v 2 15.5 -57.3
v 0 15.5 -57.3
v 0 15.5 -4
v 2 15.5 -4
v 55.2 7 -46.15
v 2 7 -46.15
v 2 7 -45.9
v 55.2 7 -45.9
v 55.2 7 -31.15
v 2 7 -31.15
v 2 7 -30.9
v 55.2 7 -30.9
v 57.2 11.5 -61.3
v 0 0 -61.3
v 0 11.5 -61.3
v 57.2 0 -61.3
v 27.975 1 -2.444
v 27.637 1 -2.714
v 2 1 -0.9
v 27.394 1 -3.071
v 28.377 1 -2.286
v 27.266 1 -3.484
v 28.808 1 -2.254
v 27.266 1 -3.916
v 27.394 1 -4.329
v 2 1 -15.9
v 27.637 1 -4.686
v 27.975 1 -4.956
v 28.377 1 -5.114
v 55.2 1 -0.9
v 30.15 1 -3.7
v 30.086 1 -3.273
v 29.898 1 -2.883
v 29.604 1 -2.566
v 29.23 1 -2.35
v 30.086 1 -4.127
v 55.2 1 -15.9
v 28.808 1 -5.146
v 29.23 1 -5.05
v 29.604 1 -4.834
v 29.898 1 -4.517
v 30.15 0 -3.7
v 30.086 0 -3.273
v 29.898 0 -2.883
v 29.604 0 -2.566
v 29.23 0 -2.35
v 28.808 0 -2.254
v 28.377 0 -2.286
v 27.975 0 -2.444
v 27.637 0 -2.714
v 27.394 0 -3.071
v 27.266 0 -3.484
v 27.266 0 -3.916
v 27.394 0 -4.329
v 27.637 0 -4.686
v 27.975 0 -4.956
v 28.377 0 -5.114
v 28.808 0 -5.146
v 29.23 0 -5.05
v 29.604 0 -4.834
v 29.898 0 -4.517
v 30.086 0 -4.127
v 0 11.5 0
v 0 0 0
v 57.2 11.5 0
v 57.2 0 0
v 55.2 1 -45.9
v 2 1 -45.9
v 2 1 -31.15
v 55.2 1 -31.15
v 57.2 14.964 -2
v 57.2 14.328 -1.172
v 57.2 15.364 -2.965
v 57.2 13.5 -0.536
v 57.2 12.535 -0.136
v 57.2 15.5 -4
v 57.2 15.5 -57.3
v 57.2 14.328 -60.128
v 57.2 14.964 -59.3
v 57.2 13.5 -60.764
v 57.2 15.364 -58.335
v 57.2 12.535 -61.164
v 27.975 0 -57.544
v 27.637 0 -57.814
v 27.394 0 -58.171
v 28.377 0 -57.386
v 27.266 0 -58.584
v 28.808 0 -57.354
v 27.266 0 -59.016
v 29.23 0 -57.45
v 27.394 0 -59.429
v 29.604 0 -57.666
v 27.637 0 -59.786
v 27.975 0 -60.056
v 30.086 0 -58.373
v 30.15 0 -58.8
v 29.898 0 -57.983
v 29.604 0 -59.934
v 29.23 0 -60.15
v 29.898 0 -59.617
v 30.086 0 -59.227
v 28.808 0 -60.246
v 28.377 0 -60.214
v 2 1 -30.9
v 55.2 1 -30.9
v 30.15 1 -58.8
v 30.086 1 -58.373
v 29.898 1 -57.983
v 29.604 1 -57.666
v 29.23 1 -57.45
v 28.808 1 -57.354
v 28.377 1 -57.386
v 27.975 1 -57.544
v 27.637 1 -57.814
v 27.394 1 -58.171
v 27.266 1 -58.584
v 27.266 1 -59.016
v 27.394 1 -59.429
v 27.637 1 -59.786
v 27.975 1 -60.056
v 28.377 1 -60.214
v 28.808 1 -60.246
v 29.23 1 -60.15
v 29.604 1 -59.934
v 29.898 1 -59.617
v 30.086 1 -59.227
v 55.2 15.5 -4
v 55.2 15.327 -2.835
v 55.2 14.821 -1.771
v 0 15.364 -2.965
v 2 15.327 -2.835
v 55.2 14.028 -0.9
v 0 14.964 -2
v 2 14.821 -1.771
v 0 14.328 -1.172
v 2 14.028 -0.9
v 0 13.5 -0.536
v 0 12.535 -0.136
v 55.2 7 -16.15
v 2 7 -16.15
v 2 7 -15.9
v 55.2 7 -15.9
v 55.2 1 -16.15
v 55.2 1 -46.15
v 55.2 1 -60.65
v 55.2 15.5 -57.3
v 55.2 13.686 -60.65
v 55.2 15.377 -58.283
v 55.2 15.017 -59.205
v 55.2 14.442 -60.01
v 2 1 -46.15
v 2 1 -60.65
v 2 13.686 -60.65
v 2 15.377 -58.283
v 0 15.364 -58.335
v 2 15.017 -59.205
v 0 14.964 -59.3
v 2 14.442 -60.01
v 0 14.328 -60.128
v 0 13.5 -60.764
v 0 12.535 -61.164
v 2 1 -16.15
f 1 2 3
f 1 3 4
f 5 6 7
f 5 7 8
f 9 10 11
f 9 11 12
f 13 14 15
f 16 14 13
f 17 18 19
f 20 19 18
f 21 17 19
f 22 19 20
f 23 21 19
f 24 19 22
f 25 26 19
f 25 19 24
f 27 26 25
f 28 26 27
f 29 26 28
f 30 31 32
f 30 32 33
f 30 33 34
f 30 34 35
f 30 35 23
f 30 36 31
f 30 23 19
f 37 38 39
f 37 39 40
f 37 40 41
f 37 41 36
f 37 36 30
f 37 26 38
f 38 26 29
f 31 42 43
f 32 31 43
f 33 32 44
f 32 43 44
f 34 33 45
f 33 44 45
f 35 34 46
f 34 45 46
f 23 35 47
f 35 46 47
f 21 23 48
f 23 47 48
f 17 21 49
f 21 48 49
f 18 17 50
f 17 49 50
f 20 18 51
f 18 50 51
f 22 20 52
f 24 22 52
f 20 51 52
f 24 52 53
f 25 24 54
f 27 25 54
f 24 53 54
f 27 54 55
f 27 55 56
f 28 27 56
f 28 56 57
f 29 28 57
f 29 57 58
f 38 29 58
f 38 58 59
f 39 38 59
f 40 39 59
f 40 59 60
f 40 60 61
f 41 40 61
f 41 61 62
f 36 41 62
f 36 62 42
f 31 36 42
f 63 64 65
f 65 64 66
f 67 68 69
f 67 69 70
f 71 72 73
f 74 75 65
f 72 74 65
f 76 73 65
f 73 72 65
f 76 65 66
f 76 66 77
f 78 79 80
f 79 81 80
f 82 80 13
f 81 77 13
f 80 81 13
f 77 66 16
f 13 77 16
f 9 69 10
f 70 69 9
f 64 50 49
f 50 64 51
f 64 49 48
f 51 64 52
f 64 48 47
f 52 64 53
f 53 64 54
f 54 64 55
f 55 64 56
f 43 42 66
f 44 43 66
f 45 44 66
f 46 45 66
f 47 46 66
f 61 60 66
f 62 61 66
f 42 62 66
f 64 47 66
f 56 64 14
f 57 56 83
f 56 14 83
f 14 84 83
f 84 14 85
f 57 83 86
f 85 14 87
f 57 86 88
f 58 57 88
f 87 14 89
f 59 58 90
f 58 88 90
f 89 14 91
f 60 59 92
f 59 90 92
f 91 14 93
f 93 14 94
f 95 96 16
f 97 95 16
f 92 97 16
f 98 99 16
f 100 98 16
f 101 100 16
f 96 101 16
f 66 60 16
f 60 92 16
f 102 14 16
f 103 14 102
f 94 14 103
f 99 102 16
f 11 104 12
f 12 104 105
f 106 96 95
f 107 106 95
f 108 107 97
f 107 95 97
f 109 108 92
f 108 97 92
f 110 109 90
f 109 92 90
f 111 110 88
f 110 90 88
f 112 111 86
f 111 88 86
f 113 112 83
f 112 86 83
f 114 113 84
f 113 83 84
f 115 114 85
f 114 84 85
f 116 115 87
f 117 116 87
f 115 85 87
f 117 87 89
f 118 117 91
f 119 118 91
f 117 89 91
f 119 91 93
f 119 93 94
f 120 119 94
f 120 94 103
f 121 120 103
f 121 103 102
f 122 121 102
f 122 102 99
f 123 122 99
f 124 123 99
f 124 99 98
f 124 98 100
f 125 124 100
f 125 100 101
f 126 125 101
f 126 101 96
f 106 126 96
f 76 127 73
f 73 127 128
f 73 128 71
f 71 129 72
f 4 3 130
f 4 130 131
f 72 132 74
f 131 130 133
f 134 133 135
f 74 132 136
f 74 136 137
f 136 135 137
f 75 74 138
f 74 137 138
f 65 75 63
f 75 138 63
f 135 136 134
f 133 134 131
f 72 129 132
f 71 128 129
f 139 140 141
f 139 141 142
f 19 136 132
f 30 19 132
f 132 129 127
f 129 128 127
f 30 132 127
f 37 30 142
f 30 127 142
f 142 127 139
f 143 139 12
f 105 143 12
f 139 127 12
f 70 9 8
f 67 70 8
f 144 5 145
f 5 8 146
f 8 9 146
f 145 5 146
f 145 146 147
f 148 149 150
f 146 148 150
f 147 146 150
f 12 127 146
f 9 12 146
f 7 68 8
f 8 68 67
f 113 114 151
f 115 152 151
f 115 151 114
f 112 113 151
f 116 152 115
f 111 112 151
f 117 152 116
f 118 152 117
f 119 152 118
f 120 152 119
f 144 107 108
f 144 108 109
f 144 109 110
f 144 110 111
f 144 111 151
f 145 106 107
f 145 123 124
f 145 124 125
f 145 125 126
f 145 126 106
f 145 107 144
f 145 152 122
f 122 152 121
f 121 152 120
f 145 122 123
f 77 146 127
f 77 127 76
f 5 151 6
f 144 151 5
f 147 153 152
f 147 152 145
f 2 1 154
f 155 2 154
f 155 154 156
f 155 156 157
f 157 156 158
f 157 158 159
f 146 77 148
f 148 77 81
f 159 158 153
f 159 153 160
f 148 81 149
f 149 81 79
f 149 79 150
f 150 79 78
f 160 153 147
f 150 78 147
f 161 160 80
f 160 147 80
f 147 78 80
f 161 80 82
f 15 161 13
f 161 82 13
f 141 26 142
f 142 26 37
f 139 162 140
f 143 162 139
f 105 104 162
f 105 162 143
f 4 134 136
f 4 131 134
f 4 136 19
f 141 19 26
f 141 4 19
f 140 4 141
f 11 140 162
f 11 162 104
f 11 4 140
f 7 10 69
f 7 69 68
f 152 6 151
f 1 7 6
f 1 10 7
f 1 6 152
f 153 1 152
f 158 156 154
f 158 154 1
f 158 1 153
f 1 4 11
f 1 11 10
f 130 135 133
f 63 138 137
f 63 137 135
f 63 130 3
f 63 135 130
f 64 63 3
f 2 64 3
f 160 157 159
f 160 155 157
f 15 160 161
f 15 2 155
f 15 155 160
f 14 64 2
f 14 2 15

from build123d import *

# Parameters (mm, degrees)
SKETCH1_W                  = 57.2
SKETCH1_H                  = 61.3
BOSS_EXTRUDE1_DEPTH        = 15.5
F_2_9_2_9_DIAMETER_HOLE1_D = 2.9
SKETCH4_W                  = 53.2
SKETCH4_H                  = 59.75
CUT_EXTRUDE1_DEPTH         = 14.5
FILLET4_R                  = 4
SKETCH5_W                  = 53.2
SKETCH5_H                  = 0.25
BOSS_EXTRUDE2_DEPTH        = 6
LPATTERN1_COUNT            = 3
LPATTERN1_PITCH            = 15


with BuildPart() as part:
    # Sketch1 → Boss-Extrude1 (new body)
    with BuildSketch(Plane(origin=(0, 0, 0), x_dir=(1, 0, 0), z_dir=(0, 1, 0))):
        with Locations((28.6, 30.65)):
            Rectangle(SKETCH1_W, SKETCH1_H)
    extrude(amount=BOSS_EXTRUDE1_DEPTH)

    # Ø2.9 (2.9) Diameter Hole1 (through all)
    with Locations(Plane(origin=(0, 15.5, 0), x_dir=(-1, 0, 0), z_dir=(0, 1, 0))):
        with Locations((-28.7, -58.8), (-28.7, -3.7)):
            Hole(F_2_9_2_9_DIAMETER_HOLE1_D / 2)

    # Sketch4 → Cut-Extrude1 (cut)
    with BuildSketch(Plane(origin=(0, 15.5, 0), x_dir=(1, 0, 0), z_dir=(0, 1, 0))):
        with Locations((28.6, 30.775)):
            Rectangle(SKETCH4_W, SKETCH4_H)
    extrude(amount=-CUT_EXTRUDE1_DEPTH, mode=Mode.SUBTRACT)

    # Fillet4
    # the kernel refuses this fillet: 4 mm, written as the material it takes off along each edge
    with BuildSketch(Plane(origin=(-10, 15.5, 0), x_dir=(0, -1, 0), z_dir=(1, 0, 0))) as fillet4_piece_1:
        with BuildLine():
            CenterArc((FILLET4_R, FILLET4_R), FILLET4_R, 180, 90)
            Line((0, FILLET4_R), (0, 0))
            Line((0, 0), (FILLET4_R, 0))
        make_face()
    extrude(amount=77.2, mode=Mode.SUBTRACT)
    with BuildSketch(Plane(origin=(67.2, 15.5, -61.3), x_dir=(0, 0, 1), z_dir=(-1, 0, 0))) as fillet4_piece_2:
        with BuildLine():
            CenterArc((FILLET4_R, -FILLET4_R), FILLET4_R, 90, 90)
            Line((0, -FILLET4_R), (0, 0))
            Line((0, 0), (FILLET4_R, 0))
        make_face()
    extrude(amount=77.2, mode=Mode.SUBTRACT)

    # Sketch5 → Boss-Extrude2 (add)
    with BuildSketch(Plane(origin=(0, 1, 0), x_dir=(1, 0, 0), z_dir=(0, 1, 0))):
        with Locations((28.6, 16.025)):
            Rectangle(SKETCH5_W, SKETCH5_H)
    boss_extrude2 = extrude(amount=BOSS_EXTRUDE2_DEPTH)

    # LPattern1: Boss-Extrude2 ×3
    with Locations(*[(0, 0, -i * LPATTERN1_PITCH) for i in range(1, LPATTERN1_COUNT)]):
        add(boss_extrude2)


solid = part.part
